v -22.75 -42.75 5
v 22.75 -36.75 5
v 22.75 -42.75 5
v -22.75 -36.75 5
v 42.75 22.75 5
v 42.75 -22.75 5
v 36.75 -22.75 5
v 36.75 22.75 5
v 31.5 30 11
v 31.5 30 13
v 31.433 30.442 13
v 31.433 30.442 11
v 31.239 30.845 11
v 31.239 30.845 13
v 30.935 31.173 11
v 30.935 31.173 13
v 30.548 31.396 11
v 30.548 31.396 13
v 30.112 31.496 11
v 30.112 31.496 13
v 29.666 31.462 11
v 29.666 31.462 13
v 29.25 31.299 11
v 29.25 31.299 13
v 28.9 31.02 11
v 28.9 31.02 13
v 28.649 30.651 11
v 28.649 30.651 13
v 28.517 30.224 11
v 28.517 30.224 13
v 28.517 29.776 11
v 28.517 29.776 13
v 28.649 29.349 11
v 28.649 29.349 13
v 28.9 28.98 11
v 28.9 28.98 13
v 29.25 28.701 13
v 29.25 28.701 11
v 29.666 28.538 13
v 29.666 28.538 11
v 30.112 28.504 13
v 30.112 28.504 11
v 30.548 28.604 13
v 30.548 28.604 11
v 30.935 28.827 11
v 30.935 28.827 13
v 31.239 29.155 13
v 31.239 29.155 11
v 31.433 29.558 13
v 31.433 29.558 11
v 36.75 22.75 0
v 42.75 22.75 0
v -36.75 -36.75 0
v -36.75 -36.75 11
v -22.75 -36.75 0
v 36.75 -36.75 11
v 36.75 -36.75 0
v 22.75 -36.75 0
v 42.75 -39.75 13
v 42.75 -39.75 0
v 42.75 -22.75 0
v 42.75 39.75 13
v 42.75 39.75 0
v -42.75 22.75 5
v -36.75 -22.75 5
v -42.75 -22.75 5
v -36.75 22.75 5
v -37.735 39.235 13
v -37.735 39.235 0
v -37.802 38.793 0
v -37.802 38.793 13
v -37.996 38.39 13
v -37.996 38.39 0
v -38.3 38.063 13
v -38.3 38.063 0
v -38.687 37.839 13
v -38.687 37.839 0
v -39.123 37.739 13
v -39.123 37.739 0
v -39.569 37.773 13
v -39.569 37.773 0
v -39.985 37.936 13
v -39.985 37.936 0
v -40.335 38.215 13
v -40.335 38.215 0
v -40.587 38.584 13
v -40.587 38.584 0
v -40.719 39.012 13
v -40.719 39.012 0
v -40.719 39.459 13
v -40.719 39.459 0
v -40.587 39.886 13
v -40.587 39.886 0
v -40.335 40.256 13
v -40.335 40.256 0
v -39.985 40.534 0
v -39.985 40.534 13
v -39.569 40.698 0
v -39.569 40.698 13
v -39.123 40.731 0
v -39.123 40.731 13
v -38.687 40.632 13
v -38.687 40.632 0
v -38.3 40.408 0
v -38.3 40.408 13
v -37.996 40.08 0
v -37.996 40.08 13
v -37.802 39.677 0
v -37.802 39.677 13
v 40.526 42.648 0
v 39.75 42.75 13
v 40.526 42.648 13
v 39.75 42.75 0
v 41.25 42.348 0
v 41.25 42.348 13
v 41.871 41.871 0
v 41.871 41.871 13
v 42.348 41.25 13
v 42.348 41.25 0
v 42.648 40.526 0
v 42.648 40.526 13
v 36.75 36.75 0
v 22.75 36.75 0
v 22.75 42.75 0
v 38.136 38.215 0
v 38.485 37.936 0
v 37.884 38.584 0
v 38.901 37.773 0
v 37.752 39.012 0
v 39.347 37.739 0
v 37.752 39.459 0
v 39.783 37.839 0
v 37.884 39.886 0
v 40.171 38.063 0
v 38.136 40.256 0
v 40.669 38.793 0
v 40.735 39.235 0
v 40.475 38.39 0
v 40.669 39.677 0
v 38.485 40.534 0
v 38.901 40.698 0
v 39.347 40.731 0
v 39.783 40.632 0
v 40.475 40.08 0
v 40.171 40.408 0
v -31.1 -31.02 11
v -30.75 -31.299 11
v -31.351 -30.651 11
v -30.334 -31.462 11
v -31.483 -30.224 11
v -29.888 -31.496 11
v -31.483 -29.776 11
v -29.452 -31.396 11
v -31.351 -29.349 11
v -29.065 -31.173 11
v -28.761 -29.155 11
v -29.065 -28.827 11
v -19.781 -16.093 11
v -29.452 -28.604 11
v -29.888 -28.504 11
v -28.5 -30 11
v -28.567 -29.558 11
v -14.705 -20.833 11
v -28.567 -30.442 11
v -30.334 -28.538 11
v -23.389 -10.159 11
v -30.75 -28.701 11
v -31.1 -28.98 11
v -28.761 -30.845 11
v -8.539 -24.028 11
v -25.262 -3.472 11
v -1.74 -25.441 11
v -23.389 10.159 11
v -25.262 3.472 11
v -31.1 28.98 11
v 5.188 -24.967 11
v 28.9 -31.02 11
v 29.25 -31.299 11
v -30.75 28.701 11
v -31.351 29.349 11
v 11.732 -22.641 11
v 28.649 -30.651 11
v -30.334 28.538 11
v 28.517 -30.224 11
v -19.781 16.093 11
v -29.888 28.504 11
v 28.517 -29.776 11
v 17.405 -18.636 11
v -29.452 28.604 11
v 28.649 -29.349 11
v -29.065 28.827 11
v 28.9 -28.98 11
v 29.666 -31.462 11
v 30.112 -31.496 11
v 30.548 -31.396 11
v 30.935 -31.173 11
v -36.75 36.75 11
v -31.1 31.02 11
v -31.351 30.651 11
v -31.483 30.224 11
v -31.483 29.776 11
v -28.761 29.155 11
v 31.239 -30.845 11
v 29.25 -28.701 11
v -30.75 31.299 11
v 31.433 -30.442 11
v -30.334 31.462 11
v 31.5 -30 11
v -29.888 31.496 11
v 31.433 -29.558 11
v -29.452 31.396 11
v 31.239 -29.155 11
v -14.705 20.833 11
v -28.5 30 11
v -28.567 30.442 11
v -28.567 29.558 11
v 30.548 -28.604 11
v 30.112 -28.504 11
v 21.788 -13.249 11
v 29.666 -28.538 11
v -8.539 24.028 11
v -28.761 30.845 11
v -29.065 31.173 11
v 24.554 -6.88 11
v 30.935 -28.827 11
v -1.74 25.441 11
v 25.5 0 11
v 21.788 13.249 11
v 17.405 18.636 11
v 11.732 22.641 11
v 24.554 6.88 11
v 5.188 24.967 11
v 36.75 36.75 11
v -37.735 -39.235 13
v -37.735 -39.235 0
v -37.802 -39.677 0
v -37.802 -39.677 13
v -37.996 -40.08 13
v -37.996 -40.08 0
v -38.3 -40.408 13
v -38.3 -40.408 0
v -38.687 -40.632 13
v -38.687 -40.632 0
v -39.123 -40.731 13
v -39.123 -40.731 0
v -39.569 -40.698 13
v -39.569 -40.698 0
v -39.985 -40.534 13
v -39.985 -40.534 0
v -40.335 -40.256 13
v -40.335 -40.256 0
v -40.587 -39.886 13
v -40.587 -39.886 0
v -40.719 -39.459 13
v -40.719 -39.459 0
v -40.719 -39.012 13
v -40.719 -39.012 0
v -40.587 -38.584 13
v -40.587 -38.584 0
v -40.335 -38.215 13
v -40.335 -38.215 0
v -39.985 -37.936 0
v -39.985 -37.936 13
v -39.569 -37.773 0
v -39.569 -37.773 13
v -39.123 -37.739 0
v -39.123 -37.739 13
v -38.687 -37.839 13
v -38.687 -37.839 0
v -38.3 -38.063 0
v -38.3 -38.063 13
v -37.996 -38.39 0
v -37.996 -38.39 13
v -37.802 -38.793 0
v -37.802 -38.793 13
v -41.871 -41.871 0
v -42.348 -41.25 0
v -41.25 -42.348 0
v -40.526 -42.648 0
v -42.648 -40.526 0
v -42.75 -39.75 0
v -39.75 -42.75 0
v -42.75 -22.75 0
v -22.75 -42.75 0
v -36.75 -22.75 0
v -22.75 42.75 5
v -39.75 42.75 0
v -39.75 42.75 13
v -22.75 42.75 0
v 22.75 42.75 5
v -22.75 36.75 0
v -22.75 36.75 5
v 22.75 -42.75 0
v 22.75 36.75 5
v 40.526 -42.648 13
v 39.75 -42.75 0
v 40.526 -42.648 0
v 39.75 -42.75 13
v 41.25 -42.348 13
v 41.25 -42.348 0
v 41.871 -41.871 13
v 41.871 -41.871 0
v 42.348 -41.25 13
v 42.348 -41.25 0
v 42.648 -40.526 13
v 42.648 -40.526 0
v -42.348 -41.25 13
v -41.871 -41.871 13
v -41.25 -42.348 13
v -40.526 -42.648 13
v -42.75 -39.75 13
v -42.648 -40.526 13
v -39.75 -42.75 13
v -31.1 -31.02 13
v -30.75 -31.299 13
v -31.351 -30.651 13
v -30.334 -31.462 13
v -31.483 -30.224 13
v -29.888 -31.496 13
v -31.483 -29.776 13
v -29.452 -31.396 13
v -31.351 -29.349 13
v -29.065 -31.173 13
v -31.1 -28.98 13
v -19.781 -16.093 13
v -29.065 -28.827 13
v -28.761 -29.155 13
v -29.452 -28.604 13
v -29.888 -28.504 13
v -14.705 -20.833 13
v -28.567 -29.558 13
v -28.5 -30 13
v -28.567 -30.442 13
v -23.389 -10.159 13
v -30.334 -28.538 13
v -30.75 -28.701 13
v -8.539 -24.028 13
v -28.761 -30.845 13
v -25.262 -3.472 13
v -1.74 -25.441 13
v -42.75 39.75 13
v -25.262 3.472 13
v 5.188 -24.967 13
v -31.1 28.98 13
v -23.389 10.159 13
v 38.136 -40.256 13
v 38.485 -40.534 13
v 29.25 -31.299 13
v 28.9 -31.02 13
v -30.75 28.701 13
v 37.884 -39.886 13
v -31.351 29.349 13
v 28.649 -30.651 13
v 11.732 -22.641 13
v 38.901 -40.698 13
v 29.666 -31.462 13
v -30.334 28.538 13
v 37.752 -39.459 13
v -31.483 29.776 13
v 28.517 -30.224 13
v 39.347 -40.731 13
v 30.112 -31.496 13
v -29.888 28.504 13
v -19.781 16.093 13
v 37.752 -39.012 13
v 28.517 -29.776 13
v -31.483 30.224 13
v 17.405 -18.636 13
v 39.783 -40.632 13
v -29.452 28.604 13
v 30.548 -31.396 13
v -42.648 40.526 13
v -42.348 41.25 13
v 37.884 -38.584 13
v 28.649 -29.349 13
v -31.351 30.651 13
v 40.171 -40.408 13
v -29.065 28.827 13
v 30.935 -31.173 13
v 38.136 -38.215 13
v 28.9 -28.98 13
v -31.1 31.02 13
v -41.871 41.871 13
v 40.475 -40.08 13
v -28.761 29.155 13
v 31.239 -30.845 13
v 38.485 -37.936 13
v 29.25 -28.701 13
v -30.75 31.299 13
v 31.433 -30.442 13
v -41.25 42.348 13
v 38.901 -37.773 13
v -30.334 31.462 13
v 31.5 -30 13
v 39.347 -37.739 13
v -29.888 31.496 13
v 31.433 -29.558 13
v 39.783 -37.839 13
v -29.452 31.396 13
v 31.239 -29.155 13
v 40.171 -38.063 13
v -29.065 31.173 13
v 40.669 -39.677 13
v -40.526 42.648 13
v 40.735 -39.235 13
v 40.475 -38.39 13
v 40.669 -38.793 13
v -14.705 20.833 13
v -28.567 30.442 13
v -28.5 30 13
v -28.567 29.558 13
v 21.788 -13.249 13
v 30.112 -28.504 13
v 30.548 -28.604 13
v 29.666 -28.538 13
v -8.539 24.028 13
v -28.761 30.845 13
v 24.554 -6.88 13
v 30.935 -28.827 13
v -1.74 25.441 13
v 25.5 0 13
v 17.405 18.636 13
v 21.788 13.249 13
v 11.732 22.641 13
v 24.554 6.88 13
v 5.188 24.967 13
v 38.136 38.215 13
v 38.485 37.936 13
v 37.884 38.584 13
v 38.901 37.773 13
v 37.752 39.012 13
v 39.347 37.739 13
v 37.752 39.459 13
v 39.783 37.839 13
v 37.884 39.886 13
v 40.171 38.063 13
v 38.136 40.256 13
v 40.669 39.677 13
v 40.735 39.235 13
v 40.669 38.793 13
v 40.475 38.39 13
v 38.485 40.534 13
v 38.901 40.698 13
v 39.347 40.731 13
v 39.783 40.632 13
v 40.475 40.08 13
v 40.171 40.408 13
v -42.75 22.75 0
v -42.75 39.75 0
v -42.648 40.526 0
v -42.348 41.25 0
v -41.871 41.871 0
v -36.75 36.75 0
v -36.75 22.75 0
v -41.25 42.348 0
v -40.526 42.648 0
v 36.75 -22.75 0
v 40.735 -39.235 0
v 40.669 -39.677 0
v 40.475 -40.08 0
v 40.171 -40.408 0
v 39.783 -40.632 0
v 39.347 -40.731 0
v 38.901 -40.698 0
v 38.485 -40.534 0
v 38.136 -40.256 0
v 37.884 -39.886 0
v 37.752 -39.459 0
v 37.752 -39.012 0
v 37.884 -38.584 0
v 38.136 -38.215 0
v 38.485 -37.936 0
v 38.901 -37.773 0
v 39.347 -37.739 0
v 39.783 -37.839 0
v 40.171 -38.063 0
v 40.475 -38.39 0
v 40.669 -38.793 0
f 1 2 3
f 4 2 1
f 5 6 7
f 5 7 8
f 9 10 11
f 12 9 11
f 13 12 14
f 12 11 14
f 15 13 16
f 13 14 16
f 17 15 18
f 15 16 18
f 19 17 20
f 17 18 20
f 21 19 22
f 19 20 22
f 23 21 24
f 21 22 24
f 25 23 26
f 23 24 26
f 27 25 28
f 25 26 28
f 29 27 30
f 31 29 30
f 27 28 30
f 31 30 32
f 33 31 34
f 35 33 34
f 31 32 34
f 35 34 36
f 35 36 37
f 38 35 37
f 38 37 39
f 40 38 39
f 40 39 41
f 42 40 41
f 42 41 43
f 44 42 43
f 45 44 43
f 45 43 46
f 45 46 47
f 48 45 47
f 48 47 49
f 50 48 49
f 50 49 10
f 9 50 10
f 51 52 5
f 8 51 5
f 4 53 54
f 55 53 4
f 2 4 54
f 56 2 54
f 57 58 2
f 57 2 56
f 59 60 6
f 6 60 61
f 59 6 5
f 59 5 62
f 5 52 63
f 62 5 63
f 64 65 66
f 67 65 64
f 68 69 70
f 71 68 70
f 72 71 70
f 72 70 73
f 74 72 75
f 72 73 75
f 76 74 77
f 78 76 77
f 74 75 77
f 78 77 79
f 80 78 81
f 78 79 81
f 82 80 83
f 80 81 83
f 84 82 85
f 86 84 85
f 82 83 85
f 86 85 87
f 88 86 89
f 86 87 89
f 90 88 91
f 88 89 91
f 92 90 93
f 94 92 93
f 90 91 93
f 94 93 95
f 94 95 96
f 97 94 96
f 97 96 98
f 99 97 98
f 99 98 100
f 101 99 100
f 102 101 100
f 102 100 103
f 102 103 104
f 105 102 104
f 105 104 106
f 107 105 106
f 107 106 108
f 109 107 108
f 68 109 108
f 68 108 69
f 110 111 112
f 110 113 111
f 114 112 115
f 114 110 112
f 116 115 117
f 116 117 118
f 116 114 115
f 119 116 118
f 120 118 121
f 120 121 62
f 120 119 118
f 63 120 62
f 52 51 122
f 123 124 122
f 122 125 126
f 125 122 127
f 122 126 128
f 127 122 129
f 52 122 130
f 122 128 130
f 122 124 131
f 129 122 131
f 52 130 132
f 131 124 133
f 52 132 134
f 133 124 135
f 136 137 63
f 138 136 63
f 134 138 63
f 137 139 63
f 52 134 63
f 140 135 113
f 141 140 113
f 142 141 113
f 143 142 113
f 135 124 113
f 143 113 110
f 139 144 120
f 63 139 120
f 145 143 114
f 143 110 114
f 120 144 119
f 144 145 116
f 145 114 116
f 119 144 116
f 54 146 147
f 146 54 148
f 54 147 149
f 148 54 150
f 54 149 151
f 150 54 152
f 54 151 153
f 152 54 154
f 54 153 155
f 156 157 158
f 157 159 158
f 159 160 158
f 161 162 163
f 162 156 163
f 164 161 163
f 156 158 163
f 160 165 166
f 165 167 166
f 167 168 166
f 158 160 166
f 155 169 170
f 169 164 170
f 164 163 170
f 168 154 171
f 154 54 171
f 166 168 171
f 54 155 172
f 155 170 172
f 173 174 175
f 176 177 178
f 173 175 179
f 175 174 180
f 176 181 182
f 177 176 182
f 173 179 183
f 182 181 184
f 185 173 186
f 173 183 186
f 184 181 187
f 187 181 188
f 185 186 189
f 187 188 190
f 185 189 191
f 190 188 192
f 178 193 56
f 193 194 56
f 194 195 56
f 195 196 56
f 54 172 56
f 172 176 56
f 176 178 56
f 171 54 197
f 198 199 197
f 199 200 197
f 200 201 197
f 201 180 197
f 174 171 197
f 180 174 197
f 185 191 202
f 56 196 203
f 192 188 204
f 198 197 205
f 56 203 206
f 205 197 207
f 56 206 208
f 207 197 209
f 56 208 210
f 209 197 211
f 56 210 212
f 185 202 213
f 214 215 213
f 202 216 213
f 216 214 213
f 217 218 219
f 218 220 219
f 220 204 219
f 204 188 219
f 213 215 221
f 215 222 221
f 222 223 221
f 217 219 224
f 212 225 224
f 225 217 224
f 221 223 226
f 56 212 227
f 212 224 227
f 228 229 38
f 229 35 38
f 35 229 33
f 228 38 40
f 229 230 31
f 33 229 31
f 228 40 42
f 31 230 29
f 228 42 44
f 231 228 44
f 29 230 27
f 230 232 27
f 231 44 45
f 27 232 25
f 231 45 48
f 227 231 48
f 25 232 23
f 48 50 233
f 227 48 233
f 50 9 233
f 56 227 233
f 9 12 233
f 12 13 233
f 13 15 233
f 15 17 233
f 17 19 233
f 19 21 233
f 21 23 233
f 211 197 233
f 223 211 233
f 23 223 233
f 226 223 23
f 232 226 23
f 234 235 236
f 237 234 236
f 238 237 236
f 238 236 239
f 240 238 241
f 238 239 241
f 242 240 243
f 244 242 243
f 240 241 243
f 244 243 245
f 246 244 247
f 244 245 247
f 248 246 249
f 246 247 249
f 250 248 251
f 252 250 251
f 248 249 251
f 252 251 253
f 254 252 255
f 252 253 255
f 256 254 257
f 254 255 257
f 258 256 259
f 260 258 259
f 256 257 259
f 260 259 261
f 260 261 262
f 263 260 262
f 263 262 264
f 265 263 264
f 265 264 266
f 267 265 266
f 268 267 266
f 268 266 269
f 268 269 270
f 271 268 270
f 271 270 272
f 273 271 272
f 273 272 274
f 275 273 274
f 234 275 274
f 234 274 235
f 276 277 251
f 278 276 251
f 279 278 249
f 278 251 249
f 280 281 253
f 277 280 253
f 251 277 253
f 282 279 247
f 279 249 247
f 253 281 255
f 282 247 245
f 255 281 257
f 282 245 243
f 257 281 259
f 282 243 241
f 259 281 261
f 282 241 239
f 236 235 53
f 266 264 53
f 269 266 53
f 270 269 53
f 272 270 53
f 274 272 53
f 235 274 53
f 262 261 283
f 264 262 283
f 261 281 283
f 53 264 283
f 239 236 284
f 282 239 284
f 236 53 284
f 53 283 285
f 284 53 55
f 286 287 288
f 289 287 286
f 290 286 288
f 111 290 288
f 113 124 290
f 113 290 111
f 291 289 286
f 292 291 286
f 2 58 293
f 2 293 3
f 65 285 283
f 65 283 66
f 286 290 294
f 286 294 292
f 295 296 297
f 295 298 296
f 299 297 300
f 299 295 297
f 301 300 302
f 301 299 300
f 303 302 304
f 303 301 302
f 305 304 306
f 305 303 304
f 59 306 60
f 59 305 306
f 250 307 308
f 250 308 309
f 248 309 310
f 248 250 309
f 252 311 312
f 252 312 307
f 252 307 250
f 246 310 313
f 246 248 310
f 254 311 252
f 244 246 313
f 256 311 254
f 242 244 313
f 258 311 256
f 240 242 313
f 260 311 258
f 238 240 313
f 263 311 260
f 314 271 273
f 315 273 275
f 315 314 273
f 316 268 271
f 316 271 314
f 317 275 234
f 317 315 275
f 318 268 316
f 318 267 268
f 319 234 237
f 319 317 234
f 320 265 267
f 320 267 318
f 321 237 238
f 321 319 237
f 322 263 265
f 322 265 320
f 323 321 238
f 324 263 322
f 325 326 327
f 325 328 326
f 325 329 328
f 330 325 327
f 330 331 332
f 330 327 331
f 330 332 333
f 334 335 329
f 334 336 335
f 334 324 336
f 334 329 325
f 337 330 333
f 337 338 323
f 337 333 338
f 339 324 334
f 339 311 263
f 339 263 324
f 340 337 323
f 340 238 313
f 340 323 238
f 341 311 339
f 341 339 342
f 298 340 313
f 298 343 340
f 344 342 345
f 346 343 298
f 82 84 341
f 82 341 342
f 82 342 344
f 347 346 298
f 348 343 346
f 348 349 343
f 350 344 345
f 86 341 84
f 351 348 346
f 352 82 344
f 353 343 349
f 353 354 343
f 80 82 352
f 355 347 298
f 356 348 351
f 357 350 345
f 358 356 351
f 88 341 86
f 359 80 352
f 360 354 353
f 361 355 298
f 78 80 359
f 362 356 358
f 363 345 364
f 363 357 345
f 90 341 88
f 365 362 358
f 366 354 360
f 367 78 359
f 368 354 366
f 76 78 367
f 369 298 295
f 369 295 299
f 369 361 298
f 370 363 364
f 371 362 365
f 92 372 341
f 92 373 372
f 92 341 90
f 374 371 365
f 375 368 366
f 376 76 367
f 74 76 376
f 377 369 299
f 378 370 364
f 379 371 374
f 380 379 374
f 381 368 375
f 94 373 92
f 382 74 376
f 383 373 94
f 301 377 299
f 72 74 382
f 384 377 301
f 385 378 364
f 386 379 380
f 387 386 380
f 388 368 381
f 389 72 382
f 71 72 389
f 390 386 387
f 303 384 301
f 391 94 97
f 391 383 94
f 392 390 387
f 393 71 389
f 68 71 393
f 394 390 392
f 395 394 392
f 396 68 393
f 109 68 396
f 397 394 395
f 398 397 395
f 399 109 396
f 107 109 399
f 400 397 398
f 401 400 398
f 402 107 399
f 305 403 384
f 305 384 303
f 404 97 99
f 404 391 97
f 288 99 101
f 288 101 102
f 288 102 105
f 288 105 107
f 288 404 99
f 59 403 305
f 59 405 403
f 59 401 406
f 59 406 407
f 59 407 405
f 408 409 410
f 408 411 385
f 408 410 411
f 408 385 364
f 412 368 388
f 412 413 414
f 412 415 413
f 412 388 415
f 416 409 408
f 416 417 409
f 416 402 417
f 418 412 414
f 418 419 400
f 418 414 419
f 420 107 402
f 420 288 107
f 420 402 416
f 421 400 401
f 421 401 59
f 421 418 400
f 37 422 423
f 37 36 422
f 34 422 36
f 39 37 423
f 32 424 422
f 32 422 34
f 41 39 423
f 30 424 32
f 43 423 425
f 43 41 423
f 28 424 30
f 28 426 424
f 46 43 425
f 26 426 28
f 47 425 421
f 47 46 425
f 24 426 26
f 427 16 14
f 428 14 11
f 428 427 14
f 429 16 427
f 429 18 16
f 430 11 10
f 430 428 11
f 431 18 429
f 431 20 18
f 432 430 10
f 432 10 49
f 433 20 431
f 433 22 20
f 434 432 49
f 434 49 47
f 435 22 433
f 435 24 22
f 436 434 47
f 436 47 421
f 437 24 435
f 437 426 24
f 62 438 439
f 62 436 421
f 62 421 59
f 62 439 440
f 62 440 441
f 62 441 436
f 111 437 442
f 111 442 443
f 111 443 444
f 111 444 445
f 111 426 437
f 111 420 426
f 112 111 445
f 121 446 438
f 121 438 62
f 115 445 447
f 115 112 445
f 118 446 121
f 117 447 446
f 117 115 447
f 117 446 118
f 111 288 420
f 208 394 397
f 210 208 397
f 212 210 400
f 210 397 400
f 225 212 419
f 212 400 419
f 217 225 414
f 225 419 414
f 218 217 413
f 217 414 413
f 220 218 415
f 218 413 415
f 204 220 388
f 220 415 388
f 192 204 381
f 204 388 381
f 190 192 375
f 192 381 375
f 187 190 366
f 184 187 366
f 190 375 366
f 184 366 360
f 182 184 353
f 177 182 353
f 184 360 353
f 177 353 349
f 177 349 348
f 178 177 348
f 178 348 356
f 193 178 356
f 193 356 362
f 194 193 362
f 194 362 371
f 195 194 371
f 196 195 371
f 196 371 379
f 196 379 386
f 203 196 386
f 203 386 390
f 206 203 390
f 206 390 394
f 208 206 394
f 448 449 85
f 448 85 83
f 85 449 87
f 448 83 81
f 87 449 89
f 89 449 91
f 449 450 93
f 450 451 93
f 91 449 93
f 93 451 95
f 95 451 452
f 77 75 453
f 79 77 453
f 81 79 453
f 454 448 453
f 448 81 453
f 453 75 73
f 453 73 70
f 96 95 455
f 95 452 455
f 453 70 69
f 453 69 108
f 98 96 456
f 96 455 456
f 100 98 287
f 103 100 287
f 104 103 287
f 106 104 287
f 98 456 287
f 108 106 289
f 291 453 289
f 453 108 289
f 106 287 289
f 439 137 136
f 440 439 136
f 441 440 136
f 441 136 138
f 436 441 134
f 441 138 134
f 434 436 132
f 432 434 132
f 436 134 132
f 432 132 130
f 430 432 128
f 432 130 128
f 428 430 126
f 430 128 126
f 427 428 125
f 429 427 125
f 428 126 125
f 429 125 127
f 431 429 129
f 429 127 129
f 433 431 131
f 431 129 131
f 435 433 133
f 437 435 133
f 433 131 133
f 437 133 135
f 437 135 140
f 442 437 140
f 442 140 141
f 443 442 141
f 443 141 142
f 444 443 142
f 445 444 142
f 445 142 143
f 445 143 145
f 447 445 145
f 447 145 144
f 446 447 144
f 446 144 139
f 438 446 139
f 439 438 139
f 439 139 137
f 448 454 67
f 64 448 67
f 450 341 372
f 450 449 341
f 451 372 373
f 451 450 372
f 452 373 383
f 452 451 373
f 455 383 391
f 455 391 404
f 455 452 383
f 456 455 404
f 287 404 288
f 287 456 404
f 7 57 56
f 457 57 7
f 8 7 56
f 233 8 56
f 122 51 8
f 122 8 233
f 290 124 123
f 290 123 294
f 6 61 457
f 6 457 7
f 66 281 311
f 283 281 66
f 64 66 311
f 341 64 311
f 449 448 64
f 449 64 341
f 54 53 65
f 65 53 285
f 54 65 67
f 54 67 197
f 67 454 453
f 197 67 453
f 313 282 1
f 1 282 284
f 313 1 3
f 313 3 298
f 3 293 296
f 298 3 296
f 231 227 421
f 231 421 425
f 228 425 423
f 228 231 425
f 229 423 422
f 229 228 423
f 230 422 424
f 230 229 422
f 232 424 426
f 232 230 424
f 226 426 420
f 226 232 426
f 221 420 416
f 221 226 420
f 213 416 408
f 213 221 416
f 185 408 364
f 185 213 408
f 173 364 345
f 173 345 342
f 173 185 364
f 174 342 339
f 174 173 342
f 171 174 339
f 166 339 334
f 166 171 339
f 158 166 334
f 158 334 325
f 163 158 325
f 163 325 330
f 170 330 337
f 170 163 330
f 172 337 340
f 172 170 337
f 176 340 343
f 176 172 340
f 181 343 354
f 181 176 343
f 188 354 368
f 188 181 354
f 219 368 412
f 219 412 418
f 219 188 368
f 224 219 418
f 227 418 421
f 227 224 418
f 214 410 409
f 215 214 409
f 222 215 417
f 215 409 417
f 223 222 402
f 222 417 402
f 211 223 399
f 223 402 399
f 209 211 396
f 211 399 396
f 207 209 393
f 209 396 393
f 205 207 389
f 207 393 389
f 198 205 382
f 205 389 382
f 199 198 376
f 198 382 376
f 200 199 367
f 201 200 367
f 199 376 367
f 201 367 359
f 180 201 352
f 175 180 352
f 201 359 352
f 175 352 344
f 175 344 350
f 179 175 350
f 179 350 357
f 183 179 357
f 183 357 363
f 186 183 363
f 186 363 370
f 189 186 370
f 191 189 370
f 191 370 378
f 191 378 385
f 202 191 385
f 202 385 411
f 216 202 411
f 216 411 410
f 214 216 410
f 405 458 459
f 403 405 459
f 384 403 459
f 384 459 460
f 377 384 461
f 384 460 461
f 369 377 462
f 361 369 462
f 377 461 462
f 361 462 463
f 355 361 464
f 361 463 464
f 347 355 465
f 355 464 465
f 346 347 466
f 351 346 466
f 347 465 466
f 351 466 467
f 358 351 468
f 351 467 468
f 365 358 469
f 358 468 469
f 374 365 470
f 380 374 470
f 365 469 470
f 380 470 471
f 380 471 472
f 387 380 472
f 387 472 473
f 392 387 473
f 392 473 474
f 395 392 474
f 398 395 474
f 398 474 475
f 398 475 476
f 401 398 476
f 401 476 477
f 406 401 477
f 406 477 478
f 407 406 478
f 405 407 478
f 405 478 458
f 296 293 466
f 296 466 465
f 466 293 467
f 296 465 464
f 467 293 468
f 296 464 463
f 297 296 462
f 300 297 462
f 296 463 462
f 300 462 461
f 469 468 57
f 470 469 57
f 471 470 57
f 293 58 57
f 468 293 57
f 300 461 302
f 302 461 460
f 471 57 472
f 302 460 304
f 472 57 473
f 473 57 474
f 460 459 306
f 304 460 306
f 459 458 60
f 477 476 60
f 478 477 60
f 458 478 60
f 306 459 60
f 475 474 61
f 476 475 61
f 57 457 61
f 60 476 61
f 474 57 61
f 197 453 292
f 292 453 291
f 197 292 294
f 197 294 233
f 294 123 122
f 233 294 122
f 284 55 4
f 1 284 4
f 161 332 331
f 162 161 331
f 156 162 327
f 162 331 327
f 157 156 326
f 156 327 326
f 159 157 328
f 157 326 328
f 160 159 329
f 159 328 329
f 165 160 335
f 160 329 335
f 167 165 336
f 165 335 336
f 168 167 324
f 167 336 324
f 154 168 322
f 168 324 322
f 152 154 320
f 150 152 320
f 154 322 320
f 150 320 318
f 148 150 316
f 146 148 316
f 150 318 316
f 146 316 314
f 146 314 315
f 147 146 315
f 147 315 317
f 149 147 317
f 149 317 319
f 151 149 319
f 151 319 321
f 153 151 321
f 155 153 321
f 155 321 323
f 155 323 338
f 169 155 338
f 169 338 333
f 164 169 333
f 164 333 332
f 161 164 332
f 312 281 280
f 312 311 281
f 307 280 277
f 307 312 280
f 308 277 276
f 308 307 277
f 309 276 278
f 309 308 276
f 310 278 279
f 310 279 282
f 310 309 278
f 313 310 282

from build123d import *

# Parameters (mm, degrees)
SKETCH021_W             = 85.5
SKETCH021_H             = 85.5
SKETCH021_W_2           = 73.5
SKETCH021_H_2           = 73.5
PAD009006_DEPTH         = 11
SKETCH022_W             = 85.5
SKETCH022_H             = 85.5
SKETCH022_R             = 25.5
PAD009007_DEPTH         = 2
SKETCH023_R             = 1.5
POCKET003002_DEPTH      = 13.001
SKETCH024_R             = 1.5
POCKET003003_DEPTH      = 5
FILLET003_R             = 3
SKETCH025_W             = 45.5
SKETCH025_H             = 5
POCKET003004_DEPTH      = 85.501
POCKET003004_DEPTH_BACK = 0.001
SKETCH026_W             = 45.5
SKETCH026_H             = 5
POCKET003005_DEPTH      = 85.501


with BuildPart() as part:
    # Sketch021 → Pad009006 (new body)
    with BuildSketch(Plane.XY):
        Rectangle(SKETCH021_W, SKETCH021_H)
        Rectangle(SKETCH021_W_2, SKETCH021_H_2, mode=Mode.SUBTRACT)
    extrude(amount=PAD009006_DEPTH)

    # Sketch022 (on Face10 of Pad009006) → Pad009007 (join)
    with BuildSketch(Plane.XY.offset(11)):
        Rectangle(SKETCH022_W, SKETCH022_H)
        Circle(SKETCH022_R, mode=Mode.SUBTRACT)
    extrude(amount=PAD009007_DEPTH)

    # Sketch023 (on Face4 of Pad009007) → Pocket003002 (cut, through all)
    with BuildSketch(Plane(origin=(0, 0, 0), x_dir=(1, 0, 0), z_dir=(0, 0, -1))):
        with Locations((-39.235281, 39.235281)):
            Circle(SKETCH023_R)
        with Locations((39.235281, 39.235281)):
            Circle(SKETCH023_R)
        with Locations((39.235281, -39.235281)):
            Circle(SKETCH023_R)
        with Locations((-39.235281, -39.235281)):
            Circle(SKETCH023_R)
    extrude(amount=-POCKET003002_DEPTH, mode=Mode.SUBTRACT)

    # Sketch024 (on Face17 of Pocket003002) → Pocket003003 (cut)
    with BuildSketch(Plane.XY.offset(13)):
        with Locations((-30, 30)):
            Circle(SKETCH024_R)
        with Locations((30, 30)):
            Circle(SKETCH024_R)
        with Locations((30, -30)):
            Circle(SKETCH024_R)
        with Locations((-30, -30)):
            Circle(SKETCH024_R)
    extrude(amount=-POCKET003003_DEPTH, mode=Mode.SUBTRACT)

    # Fillet003
    fillet003_edges = [part.edges().sort_by_distance(p)[0] for p in [
        (42.75, 42.75, 5.5),
        (-42.75, 42.75, 5.5),
        (-42.75, -42.75, 5.5),
        (42.75, -42.75, 5.5),
    ]]
    fillet(fillet003_edges, radius=FILLET003_R)

    # Sketch025 (on Face1 of Fillet003) → Pocket003004 (cut, two sides)
    with BuildSketch(Plane(origin=(0, 42.75, 0), x_dir=(-1, 0, 0), z_dir=(0, 1, 0))) as pocket003004_sk:
        with Locations((0, 2.5)):
            Rectangle(SKETCH025_W, SKETCH025_H)
    extrude(amount=-POCKET003004_DEPTH, mode=Mode.SUBTRACT)
    extrude(pocket003004_sk.sketch, amount=POCKET003004_DEPTH_BACK, mode=Mode.SUBTRACT)

    # Sketch026 (on Face19 of Pocket003004) → Pocket003005 (cut, through all)
    with BuildSketch(Plane.YZ.offset(42.75)):
        with Locations((0, 2.5)):
            Rectangle(SKETCH026_W, SKETCH026_H)
    extrude(amount=-POCKET003005_DEPTH, mode=Mode.SUBTRACT)


solid = part.part
